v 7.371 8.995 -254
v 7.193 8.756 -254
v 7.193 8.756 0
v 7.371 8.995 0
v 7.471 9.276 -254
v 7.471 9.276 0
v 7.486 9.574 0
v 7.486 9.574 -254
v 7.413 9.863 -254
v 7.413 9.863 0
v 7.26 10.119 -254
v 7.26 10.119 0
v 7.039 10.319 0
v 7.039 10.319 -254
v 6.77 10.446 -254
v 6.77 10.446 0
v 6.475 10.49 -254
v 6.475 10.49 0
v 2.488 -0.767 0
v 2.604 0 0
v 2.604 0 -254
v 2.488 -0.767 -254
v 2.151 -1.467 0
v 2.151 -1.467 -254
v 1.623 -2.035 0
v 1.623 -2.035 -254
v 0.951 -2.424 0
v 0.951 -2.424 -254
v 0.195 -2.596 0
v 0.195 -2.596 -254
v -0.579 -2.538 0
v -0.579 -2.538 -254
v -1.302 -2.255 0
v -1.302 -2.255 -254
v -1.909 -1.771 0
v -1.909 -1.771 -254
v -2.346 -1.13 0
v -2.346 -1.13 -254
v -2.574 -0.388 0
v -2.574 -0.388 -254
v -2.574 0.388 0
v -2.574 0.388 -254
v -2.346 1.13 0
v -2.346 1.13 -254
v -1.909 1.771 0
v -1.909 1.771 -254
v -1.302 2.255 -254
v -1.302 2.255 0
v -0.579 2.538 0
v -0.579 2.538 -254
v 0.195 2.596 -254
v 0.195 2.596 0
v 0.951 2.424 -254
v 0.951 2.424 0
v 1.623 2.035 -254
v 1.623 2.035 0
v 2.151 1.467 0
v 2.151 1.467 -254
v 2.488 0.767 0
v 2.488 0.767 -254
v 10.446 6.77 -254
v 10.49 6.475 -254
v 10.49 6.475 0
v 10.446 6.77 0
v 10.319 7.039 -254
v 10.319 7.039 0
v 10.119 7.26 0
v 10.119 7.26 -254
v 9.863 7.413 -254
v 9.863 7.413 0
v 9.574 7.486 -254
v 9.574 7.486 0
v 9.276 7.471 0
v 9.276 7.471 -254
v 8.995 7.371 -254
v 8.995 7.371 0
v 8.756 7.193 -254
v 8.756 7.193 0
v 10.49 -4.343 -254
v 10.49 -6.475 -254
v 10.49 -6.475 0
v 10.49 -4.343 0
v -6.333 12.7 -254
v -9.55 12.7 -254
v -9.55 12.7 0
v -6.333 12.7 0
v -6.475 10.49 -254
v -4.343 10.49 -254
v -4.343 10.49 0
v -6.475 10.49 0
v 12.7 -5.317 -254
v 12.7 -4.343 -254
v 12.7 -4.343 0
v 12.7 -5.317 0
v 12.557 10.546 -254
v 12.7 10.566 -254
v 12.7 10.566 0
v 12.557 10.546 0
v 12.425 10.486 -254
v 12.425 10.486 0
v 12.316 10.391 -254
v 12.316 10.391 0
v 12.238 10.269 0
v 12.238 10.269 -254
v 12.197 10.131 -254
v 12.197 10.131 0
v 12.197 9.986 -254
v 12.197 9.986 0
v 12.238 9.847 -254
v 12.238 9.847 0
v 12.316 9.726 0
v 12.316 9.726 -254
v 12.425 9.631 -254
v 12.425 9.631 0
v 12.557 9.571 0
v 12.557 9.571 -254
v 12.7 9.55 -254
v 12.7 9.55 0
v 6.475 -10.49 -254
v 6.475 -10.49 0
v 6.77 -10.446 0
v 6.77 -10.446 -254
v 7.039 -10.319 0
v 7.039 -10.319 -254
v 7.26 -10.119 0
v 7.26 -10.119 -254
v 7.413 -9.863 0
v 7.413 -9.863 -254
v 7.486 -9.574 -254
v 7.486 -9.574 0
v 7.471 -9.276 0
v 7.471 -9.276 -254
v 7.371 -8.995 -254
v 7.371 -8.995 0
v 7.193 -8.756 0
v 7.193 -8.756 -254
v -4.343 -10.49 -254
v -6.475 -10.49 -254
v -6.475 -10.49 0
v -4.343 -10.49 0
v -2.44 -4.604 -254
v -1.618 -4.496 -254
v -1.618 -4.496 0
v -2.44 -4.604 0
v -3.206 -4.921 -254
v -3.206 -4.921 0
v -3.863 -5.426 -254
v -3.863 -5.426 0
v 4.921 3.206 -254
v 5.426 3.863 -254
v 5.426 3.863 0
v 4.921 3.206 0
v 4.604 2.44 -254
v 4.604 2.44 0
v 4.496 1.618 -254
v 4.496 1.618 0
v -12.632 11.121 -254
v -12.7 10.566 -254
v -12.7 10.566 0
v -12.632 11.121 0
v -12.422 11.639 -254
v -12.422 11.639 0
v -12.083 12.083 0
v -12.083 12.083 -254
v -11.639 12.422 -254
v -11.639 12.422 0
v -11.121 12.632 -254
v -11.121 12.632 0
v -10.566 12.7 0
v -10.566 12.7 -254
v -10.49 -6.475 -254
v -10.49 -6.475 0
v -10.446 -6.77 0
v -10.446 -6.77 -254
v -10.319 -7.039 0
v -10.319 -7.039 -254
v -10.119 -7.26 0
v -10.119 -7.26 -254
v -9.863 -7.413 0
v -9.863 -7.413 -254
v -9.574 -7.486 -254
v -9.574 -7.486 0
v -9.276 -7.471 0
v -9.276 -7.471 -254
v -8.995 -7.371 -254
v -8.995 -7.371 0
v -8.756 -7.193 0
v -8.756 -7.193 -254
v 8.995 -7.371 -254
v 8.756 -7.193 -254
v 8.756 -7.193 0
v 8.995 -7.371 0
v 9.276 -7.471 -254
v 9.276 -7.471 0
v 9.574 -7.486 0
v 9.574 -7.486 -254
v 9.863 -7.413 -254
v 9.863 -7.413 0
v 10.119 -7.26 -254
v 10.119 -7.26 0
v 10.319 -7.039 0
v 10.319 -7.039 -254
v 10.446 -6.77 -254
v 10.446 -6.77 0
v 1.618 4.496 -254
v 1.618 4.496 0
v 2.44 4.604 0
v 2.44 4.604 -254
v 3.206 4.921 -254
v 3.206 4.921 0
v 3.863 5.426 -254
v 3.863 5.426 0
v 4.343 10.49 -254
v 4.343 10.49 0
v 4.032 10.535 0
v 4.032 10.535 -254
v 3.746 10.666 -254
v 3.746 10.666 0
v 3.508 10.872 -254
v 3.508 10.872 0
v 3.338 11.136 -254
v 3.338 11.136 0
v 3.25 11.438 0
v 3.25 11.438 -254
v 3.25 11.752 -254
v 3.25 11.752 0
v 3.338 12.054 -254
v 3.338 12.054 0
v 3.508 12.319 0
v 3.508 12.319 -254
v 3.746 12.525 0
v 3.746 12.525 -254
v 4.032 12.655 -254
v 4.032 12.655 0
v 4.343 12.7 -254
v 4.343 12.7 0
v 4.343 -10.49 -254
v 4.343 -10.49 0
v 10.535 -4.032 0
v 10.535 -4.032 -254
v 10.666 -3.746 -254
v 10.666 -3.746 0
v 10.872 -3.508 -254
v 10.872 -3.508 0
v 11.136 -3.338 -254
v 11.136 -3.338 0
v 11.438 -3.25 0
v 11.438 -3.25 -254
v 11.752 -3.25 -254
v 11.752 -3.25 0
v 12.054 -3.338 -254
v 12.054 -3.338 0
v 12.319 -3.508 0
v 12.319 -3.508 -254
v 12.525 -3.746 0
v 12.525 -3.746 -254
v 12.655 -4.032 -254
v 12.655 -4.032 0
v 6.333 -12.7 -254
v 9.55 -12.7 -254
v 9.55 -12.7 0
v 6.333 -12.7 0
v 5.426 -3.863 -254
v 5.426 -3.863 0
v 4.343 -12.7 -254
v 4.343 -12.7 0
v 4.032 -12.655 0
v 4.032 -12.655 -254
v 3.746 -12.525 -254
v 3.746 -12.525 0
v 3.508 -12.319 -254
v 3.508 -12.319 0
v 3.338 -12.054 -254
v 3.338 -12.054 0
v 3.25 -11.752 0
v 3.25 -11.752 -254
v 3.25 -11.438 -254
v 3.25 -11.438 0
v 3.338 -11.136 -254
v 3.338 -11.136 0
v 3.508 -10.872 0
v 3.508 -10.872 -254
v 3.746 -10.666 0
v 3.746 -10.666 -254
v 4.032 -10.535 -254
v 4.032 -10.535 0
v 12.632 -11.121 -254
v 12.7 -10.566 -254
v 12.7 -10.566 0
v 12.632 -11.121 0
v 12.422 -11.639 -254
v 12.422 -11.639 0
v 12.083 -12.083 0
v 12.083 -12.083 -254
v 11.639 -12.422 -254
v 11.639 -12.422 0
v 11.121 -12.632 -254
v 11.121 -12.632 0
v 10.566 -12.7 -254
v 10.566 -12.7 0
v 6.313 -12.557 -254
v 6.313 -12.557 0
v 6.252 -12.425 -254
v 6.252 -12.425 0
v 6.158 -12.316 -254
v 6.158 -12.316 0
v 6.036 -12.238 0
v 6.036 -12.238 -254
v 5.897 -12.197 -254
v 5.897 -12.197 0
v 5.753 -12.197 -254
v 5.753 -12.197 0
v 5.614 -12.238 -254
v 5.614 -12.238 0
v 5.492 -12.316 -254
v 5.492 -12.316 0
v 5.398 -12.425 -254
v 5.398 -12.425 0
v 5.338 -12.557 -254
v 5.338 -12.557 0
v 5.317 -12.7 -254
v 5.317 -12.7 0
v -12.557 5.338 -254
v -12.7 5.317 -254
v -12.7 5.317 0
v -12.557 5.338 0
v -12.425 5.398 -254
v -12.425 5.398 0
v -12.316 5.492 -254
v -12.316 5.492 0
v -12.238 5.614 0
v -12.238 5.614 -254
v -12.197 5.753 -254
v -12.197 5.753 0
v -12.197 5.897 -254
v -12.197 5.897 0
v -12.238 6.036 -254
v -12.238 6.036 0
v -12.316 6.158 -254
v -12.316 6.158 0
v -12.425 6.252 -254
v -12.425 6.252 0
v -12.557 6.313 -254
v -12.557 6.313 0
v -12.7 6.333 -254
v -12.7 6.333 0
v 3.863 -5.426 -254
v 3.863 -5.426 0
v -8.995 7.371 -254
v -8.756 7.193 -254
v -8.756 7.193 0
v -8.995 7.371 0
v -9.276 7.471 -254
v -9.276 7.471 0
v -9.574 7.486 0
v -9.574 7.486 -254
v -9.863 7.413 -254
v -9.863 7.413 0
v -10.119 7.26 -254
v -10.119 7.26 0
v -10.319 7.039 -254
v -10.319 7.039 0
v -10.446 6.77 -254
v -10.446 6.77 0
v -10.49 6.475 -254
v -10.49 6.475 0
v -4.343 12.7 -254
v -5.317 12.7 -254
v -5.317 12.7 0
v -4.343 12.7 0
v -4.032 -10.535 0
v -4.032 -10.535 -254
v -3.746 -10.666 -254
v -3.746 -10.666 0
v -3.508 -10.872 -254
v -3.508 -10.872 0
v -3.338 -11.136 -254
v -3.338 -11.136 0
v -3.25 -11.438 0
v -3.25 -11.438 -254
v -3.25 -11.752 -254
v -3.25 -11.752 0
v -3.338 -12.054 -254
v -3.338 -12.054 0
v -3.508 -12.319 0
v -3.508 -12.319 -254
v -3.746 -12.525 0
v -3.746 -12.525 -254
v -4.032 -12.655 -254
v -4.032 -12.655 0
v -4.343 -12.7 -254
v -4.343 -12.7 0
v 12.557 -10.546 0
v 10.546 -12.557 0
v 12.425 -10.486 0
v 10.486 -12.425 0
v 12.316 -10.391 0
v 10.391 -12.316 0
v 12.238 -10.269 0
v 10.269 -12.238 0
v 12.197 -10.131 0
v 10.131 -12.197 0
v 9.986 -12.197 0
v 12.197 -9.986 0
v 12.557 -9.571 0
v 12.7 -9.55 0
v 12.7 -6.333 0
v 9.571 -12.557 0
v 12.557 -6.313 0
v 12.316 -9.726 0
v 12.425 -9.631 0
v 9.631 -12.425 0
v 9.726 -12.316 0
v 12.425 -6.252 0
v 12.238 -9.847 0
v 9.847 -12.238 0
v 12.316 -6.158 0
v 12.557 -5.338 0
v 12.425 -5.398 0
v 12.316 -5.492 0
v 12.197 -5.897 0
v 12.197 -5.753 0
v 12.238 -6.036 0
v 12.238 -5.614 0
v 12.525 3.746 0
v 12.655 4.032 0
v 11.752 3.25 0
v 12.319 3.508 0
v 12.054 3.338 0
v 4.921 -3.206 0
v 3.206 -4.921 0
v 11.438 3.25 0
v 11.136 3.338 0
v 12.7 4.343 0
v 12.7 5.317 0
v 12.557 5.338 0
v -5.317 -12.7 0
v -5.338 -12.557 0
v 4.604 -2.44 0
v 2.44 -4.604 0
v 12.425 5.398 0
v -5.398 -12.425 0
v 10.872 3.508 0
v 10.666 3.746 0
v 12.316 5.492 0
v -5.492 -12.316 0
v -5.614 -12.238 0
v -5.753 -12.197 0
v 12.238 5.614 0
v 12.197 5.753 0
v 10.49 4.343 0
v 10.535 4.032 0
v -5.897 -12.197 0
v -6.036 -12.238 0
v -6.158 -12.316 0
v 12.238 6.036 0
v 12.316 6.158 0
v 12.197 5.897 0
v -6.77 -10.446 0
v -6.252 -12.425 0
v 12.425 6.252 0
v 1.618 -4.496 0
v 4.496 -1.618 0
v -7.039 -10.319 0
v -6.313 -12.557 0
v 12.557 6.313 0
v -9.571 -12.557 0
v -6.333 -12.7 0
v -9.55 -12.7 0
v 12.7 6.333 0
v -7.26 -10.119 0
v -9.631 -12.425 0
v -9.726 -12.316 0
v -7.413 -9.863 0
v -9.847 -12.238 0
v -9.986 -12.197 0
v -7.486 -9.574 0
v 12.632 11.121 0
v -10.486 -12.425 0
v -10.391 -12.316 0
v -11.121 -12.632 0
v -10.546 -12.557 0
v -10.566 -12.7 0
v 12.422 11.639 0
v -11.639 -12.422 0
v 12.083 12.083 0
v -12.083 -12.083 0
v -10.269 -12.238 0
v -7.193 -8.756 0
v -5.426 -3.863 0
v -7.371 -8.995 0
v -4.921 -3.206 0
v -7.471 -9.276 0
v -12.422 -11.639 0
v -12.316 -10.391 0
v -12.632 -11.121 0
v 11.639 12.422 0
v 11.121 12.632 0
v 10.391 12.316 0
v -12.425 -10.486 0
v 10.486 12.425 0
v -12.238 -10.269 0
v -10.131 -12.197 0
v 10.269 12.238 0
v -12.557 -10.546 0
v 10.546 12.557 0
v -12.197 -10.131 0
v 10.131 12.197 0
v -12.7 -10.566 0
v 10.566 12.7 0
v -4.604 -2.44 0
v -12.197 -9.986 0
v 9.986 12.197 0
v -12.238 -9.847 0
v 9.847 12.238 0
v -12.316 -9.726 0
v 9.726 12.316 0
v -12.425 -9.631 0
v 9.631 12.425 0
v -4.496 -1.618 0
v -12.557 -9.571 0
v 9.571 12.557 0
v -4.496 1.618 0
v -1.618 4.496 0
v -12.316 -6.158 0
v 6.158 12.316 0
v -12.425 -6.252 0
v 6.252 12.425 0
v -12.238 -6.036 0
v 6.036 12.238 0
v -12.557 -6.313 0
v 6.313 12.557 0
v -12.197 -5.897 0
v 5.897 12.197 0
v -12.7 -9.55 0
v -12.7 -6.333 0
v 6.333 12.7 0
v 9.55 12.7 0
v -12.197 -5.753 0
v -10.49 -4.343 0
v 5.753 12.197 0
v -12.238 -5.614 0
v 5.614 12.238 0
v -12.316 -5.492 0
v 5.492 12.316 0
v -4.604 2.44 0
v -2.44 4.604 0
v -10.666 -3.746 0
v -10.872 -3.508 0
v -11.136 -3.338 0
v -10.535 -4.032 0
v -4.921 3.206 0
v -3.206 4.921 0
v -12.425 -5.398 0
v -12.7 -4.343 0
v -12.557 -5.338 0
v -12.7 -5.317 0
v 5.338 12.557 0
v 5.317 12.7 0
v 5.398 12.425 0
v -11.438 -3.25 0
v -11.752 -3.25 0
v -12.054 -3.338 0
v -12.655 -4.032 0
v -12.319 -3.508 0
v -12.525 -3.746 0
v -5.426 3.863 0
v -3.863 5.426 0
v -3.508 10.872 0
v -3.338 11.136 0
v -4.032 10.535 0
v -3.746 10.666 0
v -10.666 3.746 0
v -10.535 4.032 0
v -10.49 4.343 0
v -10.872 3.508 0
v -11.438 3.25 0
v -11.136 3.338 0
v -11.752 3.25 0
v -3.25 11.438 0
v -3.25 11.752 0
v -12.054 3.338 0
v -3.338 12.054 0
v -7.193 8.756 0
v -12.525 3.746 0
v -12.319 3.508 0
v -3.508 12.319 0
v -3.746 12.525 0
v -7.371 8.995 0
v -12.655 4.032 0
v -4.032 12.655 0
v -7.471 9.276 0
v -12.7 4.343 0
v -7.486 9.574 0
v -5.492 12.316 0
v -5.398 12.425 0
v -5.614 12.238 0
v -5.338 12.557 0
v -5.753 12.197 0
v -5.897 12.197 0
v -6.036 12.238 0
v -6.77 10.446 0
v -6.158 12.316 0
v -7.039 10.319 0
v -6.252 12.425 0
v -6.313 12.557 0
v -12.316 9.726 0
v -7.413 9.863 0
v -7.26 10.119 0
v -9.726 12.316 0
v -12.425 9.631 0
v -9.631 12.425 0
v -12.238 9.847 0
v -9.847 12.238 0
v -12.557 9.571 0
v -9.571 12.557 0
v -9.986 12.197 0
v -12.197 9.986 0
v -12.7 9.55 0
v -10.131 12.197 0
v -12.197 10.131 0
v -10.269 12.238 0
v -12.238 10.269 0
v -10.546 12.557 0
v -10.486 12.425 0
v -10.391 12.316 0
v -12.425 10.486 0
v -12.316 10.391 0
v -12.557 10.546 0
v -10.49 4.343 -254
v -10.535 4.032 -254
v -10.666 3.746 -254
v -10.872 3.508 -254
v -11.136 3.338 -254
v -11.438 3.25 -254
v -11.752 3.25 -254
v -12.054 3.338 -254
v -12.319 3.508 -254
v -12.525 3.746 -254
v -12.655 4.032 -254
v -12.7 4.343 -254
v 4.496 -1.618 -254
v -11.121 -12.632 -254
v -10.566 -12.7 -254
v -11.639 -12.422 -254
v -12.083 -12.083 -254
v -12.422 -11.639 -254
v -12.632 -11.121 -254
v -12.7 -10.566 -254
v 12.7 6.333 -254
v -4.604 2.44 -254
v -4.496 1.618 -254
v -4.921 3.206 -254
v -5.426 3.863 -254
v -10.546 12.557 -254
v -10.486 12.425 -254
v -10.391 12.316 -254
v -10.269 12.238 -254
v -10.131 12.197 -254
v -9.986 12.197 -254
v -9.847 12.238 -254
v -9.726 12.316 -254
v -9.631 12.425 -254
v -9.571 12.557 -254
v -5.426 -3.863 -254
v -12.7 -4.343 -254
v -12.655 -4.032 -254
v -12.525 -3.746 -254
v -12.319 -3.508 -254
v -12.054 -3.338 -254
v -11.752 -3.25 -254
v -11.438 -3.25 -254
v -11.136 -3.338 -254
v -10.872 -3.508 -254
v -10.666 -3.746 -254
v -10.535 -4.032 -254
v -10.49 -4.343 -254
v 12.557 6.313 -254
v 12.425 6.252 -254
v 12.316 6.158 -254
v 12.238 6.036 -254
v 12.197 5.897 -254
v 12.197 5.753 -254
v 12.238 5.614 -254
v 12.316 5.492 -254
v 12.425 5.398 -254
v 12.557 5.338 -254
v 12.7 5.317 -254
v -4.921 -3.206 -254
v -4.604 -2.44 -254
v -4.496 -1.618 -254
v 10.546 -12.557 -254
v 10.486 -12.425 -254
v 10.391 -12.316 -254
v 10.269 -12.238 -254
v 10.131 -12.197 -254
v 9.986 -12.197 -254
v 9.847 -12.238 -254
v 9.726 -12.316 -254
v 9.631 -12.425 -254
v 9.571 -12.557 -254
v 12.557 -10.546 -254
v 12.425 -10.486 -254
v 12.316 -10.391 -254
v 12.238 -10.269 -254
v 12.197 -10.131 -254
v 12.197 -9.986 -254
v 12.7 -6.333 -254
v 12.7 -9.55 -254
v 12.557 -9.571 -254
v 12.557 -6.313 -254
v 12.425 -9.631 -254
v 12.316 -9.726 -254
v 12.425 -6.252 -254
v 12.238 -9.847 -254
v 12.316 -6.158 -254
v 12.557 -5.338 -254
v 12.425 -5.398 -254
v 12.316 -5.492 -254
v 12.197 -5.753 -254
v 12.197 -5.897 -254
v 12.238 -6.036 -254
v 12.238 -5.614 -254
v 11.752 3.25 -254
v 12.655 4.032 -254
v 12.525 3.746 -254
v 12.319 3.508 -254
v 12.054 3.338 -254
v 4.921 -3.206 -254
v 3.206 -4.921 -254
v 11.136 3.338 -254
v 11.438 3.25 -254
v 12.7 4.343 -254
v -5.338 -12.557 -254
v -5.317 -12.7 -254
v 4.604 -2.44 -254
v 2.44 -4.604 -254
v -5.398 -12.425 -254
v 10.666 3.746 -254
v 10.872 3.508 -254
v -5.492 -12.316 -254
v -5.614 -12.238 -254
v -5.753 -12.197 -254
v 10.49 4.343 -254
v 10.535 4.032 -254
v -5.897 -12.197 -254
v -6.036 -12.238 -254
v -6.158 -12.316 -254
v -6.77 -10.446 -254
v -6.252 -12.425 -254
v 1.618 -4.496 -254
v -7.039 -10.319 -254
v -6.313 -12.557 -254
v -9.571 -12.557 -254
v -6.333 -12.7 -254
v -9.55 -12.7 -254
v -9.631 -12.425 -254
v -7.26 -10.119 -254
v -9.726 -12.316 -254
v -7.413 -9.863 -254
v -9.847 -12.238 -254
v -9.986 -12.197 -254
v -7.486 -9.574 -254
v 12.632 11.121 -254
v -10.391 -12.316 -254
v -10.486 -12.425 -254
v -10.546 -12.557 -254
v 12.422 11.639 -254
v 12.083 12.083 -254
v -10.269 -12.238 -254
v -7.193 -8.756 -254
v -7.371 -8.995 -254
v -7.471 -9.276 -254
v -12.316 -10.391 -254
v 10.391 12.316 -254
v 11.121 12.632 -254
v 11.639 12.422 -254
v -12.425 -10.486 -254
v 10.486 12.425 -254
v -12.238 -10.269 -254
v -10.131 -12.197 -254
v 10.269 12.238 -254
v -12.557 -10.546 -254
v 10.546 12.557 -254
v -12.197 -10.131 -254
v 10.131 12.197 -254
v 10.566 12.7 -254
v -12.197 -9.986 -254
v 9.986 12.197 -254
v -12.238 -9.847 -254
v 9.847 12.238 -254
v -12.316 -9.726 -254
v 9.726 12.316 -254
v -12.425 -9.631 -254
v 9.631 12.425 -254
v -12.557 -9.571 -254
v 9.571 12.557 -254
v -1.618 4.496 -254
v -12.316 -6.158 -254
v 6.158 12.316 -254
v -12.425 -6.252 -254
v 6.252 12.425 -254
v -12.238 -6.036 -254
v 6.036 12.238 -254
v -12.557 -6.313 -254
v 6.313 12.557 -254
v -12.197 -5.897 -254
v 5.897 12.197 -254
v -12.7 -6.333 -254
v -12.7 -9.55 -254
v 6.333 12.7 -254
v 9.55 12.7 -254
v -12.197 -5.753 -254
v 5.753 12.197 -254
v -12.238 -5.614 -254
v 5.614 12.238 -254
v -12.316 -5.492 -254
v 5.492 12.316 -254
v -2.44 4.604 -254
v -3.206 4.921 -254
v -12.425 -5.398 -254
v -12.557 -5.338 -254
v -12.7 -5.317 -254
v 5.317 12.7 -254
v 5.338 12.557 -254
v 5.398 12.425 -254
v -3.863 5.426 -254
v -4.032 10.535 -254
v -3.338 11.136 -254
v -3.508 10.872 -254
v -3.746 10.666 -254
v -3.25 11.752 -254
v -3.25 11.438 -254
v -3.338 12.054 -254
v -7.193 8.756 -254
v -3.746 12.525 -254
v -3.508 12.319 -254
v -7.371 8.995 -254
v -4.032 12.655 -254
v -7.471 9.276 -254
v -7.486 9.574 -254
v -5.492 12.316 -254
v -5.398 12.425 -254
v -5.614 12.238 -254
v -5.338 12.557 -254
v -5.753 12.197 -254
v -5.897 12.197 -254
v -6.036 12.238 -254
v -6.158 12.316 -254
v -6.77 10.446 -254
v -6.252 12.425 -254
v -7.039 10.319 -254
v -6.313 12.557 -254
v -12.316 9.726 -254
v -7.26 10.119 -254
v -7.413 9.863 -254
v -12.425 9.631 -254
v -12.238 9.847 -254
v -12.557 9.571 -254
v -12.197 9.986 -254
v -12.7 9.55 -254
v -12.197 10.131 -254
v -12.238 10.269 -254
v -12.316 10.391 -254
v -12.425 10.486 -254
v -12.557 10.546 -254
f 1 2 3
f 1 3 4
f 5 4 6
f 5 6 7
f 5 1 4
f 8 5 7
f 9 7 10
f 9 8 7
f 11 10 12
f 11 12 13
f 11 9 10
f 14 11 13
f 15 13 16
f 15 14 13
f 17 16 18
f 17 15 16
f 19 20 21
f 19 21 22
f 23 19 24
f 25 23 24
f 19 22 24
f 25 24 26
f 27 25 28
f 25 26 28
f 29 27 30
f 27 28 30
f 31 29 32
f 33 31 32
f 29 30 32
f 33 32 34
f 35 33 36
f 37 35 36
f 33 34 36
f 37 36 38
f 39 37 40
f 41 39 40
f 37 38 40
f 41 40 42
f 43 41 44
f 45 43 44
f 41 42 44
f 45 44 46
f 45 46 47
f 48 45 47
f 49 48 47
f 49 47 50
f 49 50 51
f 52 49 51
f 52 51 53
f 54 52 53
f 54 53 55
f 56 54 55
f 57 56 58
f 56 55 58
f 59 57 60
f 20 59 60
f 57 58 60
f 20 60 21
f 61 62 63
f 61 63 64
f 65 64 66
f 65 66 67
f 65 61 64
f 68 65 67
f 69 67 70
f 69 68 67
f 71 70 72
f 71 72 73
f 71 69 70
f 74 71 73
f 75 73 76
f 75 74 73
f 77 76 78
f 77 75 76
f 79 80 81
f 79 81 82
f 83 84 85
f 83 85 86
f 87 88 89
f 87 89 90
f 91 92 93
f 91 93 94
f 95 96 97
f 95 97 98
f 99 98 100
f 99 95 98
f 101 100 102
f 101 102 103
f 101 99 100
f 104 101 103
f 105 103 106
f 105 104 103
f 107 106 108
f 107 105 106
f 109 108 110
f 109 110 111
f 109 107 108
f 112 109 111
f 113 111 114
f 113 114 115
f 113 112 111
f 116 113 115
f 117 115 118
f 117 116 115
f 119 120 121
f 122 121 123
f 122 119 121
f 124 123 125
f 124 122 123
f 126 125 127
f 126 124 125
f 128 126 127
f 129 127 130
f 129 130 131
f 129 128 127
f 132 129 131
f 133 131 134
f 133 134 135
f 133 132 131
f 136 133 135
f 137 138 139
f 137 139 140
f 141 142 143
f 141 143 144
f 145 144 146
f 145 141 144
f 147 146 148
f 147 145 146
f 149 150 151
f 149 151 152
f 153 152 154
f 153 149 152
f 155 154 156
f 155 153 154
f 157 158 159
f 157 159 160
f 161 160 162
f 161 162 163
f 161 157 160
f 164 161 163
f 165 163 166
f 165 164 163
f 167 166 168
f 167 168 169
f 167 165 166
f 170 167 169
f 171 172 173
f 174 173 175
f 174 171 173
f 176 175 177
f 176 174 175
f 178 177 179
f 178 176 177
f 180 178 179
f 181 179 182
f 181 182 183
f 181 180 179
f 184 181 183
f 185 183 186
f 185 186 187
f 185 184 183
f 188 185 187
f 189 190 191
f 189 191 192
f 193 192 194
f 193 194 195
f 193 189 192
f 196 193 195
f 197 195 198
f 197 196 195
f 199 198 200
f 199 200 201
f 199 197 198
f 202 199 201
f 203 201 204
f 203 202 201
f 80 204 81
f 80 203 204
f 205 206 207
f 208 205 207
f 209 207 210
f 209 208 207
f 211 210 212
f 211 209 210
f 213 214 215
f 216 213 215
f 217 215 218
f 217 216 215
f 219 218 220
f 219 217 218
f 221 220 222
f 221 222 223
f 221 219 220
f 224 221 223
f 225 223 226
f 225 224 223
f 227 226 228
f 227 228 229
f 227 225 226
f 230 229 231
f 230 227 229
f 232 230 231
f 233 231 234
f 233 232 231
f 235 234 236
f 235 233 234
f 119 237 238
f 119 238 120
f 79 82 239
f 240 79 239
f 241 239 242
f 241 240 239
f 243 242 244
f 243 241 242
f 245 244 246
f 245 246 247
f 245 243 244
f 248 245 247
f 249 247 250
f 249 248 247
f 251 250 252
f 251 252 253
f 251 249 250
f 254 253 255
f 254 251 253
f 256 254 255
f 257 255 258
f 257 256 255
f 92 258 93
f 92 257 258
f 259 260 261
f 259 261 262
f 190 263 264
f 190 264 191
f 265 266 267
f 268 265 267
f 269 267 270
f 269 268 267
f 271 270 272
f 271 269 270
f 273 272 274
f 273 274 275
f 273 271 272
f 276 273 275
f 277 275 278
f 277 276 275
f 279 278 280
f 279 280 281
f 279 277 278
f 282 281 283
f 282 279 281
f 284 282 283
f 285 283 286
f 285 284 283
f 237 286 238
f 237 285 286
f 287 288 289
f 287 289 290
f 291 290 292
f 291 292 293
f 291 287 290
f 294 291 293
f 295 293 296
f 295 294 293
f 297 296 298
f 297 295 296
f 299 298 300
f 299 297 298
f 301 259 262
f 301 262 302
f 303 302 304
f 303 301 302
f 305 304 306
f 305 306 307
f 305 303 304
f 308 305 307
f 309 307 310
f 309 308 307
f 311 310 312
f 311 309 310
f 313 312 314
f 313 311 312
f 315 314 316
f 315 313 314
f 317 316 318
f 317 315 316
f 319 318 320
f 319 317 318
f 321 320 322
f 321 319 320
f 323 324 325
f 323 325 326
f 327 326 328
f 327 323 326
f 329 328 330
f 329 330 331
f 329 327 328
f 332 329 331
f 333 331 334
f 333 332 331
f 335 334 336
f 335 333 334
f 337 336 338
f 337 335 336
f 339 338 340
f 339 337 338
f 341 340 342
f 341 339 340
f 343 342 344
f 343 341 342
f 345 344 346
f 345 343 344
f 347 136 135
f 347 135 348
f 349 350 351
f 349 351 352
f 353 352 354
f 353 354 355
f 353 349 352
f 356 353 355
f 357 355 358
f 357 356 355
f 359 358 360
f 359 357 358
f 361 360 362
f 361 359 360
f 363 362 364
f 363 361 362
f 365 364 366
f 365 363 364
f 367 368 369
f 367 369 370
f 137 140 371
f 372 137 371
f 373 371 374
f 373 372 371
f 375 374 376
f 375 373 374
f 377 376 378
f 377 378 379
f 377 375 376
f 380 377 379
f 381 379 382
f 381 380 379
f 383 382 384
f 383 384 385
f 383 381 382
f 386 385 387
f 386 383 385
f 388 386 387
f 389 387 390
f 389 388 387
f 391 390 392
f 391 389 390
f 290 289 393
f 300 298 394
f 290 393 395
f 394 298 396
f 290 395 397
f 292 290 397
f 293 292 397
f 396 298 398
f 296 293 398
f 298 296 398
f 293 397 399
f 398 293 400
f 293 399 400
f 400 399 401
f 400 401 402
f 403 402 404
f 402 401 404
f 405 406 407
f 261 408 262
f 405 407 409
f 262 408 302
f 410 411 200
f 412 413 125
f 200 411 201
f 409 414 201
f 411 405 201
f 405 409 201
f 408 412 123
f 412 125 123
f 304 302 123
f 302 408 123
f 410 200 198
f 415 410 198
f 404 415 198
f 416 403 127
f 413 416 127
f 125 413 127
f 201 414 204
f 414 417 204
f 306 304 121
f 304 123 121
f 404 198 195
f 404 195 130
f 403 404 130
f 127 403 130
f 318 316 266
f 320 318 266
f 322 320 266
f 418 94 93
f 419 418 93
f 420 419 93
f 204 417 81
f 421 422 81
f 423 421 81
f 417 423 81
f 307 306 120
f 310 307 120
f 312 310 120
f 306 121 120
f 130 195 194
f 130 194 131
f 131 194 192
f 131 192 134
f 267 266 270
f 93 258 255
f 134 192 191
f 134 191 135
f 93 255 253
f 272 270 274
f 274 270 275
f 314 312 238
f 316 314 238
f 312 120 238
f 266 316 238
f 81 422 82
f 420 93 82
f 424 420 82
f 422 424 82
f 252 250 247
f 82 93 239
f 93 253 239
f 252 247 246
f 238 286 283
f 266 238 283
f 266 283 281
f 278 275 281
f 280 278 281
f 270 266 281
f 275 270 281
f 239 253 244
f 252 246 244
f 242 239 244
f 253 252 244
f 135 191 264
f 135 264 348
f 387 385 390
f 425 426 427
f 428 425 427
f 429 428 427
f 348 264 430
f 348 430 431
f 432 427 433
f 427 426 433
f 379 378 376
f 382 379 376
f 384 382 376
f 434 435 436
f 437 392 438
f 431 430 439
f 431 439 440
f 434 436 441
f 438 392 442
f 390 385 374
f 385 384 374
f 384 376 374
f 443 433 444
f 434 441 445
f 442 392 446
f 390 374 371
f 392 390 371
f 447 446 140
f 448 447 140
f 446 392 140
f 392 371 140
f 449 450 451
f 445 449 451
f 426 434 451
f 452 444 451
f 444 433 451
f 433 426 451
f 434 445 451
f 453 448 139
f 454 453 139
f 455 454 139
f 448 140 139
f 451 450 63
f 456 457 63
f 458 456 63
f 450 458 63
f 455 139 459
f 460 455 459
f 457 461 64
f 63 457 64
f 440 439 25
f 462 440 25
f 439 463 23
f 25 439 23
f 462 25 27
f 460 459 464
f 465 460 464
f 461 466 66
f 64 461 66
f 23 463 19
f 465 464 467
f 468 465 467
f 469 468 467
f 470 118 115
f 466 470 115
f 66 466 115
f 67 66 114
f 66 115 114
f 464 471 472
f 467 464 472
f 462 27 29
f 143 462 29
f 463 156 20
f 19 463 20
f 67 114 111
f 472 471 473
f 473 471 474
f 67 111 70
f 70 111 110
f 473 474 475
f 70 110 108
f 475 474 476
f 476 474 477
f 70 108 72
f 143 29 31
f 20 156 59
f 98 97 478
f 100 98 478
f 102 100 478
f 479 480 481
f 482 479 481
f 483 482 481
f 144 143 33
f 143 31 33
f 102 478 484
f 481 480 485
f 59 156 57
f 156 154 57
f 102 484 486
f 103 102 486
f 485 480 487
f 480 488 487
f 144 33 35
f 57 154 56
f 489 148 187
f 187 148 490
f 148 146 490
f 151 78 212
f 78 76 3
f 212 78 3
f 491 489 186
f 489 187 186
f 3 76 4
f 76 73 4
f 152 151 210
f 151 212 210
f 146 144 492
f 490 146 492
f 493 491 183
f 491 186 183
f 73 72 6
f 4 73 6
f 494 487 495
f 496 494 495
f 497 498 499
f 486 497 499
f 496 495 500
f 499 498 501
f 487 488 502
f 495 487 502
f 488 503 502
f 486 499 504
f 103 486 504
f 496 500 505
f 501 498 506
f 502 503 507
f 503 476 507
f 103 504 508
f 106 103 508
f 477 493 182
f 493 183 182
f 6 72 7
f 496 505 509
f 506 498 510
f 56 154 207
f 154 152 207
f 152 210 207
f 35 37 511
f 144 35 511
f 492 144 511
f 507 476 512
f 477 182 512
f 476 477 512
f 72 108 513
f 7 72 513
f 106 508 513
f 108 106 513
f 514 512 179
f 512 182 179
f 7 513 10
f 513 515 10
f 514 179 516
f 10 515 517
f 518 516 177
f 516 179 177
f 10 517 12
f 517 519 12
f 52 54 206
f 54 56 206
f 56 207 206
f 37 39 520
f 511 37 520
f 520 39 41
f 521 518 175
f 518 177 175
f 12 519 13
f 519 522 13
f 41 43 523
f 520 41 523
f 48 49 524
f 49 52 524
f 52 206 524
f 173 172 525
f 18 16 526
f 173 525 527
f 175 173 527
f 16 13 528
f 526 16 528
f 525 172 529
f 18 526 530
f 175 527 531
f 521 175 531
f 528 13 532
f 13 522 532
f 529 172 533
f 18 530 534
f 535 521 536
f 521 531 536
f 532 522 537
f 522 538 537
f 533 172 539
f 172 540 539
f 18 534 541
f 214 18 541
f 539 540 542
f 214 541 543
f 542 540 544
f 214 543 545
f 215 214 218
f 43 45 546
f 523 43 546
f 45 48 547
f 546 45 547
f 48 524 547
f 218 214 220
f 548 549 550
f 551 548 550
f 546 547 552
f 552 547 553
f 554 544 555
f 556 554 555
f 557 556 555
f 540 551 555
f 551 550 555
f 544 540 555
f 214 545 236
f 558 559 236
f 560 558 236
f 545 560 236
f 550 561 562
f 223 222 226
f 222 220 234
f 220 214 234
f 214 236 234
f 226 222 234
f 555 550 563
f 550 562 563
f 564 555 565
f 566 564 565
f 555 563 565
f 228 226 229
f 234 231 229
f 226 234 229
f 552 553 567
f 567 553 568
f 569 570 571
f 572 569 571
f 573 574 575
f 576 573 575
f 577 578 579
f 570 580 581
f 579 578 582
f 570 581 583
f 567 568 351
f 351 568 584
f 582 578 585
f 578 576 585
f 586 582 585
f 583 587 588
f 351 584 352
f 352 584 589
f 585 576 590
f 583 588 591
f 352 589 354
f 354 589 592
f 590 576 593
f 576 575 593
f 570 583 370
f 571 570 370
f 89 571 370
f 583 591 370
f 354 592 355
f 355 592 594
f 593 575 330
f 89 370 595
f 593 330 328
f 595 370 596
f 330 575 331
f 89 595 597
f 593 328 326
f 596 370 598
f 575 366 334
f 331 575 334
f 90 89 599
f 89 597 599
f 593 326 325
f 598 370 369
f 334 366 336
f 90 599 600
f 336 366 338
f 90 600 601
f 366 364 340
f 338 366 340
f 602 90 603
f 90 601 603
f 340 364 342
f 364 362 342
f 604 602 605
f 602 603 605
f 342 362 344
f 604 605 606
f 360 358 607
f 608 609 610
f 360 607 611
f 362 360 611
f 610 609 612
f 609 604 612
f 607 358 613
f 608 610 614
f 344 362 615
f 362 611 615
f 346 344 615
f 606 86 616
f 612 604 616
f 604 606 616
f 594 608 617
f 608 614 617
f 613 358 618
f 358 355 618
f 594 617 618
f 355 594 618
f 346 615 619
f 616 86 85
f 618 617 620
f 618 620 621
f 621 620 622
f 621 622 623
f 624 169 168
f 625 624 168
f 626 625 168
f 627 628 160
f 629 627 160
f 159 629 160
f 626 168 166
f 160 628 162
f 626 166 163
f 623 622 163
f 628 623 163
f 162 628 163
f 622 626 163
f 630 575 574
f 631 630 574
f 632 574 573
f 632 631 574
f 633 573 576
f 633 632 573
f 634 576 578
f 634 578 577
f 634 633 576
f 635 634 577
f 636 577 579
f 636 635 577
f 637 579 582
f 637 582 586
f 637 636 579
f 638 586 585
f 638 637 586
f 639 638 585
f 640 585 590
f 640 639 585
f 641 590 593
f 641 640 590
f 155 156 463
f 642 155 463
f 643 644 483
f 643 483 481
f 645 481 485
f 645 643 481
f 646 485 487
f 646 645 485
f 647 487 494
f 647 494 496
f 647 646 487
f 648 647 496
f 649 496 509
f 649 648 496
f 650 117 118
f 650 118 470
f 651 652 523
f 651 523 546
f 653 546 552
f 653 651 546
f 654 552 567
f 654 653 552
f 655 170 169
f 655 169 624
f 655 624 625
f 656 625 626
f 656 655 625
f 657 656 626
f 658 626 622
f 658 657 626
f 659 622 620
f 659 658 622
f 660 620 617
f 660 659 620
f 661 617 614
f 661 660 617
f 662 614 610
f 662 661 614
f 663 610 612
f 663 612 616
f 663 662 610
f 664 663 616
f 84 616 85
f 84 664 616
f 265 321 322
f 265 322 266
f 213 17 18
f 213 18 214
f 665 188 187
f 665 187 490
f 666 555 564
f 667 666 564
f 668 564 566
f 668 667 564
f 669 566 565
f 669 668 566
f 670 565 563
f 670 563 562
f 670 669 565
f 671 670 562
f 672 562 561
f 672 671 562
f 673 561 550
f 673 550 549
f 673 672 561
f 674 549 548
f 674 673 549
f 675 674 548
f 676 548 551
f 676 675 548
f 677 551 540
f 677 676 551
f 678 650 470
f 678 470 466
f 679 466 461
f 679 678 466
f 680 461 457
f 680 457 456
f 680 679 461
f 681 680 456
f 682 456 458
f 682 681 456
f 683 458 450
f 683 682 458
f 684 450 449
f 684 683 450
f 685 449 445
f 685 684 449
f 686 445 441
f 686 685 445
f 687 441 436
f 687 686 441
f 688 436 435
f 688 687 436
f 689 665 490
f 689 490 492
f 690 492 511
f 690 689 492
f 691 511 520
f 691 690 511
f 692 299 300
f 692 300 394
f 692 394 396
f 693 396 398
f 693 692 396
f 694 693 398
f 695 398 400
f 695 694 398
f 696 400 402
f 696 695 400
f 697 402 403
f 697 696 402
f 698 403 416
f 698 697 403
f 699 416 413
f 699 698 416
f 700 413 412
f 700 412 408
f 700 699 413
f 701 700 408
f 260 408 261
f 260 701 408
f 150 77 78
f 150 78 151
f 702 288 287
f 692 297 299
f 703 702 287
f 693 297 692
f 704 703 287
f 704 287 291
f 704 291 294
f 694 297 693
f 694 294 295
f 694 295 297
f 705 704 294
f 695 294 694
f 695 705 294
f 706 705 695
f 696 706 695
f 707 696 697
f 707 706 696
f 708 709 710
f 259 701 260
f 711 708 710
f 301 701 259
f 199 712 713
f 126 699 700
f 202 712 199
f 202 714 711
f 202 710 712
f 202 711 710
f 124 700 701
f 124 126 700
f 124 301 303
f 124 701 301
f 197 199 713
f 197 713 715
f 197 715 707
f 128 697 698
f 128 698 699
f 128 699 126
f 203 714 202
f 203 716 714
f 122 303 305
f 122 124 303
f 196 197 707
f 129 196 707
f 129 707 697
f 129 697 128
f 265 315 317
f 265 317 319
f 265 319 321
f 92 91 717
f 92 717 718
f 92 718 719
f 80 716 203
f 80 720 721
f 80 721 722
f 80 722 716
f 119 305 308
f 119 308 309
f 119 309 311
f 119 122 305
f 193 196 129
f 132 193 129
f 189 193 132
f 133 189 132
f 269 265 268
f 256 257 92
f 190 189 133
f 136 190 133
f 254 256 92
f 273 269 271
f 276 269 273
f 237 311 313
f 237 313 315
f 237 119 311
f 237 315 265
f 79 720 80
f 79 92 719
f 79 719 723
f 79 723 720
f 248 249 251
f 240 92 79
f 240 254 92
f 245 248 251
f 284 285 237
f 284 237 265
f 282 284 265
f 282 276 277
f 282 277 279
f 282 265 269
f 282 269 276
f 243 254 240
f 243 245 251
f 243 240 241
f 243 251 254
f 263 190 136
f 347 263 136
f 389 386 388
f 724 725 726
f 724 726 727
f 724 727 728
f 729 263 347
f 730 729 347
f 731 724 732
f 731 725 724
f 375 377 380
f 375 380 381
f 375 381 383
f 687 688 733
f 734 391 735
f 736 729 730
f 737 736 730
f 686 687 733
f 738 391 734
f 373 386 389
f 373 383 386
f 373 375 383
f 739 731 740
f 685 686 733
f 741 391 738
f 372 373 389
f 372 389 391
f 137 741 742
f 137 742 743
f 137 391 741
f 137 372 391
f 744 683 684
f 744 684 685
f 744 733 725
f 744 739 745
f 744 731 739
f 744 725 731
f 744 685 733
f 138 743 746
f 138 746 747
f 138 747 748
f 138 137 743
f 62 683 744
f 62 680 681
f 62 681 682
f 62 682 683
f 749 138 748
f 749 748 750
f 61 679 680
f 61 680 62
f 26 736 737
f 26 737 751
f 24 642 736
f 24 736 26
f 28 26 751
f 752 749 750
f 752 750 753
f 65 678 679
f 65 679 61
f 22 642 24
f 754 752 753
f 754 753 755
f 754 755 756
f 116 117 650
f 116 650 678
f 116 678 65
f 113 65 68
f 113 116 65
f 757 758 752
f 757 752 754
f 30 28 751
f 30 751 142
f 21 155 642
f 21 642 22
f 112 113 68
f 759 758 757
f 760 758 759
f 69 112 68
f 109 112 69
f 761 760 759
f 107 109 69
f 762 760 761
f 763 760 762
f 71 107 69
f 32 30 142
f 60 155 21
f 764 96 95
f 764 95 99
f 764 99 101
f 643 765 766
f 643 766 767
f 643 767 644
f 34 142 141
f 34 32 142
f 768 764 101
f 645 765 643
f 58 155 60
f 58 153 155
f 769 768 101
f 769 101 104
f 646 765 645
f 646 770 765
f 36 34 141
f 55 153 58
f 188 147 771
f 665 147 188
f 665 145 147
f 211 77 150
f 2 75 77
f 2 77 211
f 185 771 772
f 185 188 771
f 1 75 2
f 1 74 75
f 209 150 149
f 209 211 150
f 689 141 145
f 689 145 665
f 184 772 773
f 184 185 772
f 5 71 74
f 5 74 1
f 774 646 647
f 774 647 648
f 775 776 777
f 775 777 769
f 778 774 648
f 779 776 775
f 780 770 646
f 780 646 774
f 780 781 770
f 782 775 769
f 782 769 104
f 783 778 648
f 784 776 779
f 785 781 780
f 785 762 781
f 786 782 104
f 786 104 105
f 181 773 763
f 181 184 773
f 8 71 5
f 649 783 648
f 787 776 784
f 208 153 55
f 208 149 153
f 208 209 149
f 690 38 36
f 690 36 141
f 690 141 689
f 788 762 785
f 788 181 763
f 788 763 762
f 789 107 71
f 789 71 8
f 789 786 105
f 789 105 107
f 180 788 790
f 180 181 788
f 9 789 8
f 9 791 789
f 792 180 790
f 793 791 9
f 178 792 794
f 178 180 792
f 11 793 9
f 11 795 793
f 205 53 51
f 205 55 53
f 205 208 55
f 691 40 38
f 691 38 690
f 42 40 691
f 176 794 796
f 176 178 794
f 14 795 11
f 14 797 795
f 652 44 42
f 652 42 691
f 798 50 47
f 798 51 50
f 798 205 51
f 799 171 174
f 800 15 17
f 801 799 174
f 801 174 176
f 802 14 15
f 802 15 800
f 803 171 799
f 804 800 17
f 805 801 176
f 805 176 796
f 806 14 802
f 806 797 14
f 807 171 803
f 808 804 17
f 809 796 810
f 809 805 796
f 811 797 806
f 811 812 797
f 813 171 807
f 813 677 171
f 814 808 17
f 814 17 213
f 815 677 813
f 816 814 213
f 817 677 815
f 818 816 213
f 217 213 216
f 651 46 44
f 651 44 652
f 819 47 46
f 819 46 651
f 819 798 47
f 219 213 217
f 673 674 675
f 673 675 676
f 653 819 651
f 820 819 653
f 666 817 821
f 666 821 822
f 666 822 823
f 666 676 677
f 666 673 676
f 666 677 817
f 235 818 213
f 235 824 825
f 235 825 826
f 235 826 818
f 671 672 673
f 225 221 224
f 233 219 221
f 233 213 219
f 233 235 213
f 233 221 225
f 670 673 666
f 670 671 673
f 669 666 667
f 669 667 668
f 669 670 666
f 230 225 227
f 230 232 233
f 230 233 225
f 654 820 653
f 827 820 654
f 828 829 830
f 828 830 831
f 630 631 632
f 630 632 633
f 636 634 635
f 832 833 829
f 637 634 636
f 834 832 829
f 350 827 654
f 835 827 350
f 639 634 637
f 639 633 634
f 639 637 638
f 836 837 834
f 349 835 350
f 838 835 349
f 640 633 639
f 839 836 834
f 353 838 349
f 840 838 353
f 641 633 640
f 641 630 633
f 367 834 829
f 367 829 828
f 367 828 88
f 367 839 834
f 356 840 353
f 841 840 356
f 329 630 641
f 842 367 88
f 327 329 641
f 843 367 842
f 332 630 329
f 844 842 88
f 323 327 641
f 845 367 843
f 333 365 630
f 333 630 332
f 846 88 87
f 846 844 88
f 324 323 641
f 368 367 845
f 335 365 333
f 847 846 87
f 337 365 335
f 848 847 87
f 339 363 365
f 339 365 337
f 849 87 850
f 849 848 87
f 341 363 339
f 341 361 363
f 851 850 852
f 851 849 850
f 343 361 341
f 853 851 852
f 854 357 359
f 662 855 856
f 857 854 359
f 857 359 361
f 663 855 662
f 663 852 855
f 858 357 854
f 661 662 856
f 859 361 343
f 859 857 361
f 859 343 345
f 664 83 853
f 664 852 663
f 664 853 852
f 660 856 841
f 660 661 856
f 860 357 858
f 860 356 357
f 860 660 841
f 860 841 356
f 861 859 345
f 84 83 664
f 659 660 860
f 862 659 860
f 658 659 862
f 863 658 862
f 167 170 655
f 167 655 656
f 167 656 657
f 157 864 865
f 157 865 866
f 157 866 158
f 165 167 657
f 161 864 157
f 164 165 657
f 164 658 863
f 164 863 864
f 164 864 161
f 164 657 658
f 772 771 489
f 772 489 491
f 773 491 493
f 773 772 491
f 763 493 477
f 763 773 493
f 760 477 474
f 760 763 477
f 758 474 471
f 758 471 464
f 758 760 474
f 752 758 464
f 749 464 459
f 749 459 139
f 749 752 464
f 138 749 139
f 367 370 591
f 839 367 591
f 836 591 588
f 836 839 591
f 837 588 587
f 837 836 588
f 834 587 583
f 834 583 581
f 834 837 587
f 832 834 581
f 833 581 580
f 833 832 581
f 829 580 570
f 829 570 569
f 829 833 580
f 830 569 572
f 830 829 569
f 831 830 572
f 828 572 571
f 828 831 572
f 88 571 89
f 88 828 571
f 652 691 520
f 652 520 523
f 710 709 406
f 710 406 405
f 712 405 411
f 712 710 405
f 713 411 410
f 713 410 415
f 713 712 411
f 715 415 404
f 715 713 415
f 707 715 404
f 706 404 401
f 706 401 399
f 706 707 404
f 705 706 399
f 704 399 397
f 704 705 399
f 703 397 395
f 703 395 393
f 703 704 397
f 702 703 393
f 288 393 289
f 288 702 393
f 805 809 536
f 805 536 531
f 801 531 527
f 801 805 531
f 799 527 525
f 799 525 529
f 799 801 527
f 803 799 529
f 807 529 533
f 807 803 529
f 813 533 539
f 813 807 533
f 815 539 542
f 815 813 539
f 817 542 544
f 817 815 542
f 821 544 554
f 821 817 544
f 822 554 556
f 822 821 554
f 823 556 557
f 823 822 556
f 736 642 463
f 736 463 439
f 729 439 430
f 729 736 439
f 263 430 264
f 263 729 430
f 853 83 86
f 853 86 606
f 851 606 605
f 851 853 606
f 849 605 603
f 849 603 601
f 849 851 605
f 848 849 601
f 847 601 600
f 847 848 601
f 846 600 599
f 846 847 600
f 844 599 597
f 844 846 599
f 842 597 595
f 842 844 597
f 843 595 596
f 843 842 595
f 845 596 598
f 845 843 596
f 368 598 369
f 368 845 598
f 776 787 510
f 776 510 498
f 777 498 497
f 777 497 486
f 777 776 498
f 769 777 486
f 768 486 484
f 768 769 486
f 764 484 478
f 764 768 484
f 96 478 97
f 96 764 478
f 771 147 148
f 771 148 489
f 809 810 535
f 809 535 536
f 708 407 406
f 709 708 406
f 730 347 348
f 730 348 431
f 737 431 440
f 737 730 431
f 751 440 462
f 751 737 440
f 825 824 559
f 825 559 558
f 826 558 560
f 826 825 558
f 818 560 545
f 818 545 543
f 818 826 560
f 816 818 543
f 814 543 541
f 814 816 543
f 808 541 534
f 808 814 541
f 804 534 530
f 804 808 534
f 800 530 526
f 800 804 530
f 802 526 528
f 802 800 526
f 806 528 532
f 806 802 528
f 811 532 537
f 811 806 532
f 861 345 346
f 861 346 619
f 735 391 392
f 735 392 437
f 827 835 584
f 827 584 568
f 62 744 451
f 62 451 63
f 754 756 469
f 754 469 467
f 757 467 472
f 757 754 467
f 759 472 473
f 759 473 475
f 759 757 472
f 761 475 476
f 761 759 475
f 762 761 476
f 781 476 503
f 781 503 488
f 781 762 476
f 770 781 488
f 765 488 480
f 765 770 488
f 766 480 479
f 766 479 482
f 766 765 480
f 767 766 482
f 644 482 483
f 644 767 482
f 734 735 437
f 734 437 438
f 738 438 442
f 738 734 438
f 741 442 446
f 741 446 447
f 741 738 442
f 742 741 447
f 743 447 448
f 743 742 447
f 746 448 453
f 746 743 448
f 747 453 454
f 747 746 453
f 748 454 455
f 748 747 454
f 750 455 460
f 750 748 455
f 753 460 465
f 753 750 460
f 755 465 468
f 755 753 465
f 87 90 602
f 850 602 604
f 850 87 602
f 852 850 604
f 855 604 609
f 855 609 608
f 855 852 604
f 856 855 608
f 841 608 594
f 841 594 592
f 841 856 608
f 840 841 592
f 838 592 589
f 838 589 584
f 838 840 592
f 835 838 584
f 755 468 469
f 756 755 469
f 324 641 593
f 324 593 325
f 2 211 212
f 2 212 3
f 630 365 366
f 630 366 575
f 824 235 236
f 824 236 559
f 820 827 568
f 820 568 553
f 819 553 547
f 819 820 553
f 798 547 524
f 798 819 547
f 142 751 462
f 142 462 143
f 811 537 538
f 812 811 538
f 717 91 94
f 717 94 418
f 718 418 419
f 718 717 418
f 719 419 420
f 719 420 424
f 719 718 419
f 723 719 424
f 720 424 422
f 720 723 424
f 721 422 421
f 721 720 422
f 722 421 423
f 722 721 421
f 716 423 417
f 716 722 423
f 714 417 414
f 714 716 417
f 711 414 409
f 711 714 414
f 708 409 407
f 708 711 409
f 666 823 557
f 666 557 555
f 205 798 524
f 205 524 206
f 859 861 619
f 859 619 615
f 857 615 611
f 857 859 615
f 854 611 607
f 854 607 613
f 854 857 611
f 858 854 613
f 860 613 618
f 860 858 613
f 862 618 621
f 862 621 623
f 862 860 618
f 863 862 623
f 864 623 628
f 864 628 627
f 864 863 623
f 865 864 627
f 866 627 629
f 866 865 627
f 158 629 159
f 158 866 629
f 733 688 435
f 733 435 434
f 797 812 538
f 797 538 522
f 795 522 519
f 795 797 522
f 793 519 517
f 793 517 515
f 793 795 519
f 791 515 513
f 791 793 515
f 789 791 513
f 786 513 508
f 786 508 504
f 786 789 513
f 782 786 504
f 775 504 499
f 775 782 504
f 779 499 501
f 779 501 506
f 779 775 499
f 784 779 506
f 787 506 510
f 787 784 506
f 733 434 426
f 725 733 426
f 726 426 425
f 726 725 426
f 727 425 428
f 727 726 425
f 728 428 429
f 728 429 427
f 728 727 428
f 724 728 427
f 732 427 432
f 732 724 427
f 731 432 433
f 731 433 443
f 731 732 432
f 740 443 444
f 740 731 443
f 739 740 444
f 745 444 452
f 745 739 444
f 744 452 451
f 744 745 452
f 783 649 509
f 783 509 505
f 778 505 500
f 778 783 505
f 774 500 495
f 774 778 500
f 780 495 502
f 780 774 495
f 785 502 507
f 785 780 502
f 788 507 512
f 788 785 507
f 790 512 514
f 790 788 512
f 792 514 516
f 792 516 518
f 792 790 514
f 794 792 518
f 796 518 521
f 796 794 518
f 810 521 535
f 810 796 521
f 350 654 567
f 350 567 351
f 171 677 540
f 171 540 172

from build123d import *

# Parameters (mm, degrees)
SKETCH1_R           = 2.6035
BOSS_EXTRUDE1_DEPTH = 254


with BuildPart() as part:
    # Sketch1 → Boss-Extrude1 (new body)
    with BuildSketch(Plane(origin=(0, 0, -254), x_dir=(-1, 0, 0), z_dir=(0, 0, -1))):
        with BuildLine():
            Line((12.700000001, -9.550399995), (12.700000001, -6.333083598))
            ThreePointArc((12.700000001, -6.333083598), (12.192000001, -5.825083598), (12.700000001, -5.317083598))
            Line((12.700000001, -5.317083598), (12.700000001, -4.343399998))
            ThreePointArc((12.700000001, -4.343399998), (11.595100001, -3.238499998), (10.490200001, -4.343399998))
            Line((10.490200001, -4.343399998), (10.490200001, -6.474794454))
            ThreePointArc((10.490200001, -6.474794454), (9.863006368, -7.413456059), (8.755779511, -7.193214943))
            Line((8.755779511, -7.193214943), (5.425735971, -3.863171403))
            ThreePointArc((5.425735971, -3.863171403), (4.737482485, -2.83312727), (4.495800001, -1.618107372))
            Line((4.495800001, -1.618107372), (4.495800001, 1.618107372))
            ThreePointArc((4.495800001, 1.618107372), (4.737482485, 2.83312727), (5.425735971, 3.863171403))
            Line((5.425735971, 3.863171403), (8.755779512, 7.193214944))
            ThreePointArc((8.755779512, 7.193214944), (9.863006368, 7.413456059), (10.490200001, 6.474794455))
            Line((10.490200001, 6.474794455), (10.490200001, 4.343399973))
            ThreePointArc((10.490200001, 4.343399973), (11.595100001, 3.238499973), (12.700000001, 4.343399973))
            Line((12.700000001, 4.343399973), (12.700000001, 5.317083602))
            ThreePointArc((12.700000001, 5.317083602), (12.192000001, 5.825083602), (12.700000001, 6.333083602))
            Line((12.700000001, 6.333083602), (12.700000001, 9.550400003))
            ThreePointArc((12.700000001, 9.550400003), (12.192000008, 10.058323495), (12.699846987, 10.566399978))
            ThreePointArc((12.699846987, 10.566399978), (12.082522518, 12.08252252), (10.566399975, 12.699846984))
            ThreePointArc((10.566399975, 12.699846984), (10.058323492, 12.19200001), (9.550400004, 12.700000002))
            Line((9.550400004, 12.700000002), (6.333083601, 12.700000002))
            ThreePointArc((6.333083601, 12.700000002), (5.825083601, 12.192000002), (5.317083601, 12.700000002))
            Line((5.317083601, 12.700000002), (4.343400001, 12.700000002))
            ThreePointArc((4.343400001, 12.700000002), (3.238500001, 11.595100002), (4.343400001, 10.490200002))
            Line((4.343400001, 10.490200002), (6.474794457, 10.490200002))
            ThreePointArc((6.474794457, 10.490200002), (7.413456062, 9.863006369), (7.193214947, 8.755779512))
            Line((7.193214947, 8.755779512), (3.863171407, 5.425735972))
            ThreePointArc((3.863171407, 5.425735972), (2.833127274, 4.737482486), (1.618107376, 4.495800002))
            Line((1.618107376, 4.495800002), (-1.618107374, 4.495800002))
            ThreePointArc((-1.618107374, 4.495800002), (-2.833127271, 4.737482486), (-3.863171404, 5.425735972))
            Line((-3.863171404, 5.425735972), (-7.193214944, 8.755779512))
            ThreePointArc((-7.193214944, 8.755779512), (-7.41345606, 9.863006369), (-6.474794455, 10.490200002))
            Line((-6.474794455, 10.490200002), (-4.34339997, 10.490200002))
            ThreePointArc((-4.34339997, 10.490200002), (-3.23849997, 11.595100002), (-4.34339997, 12.700000002))
            Line((-4.34339997, 12.700000002), (-5.317083599, 12.700000002))
            ThreePointArc((-5.317083599, 12.700000002), (-5.825083599, 12.192000002), (-6.333083599, 12.700000002))
            Line((-6.333083599, 12.700000002), (-9.550399999, 12.700000002))
            ThreePointArc((-9.550399999, 12.700000002), (-10.058323491, 12.192000008), (-10.566399976, 12.699846986))
            ThreePointArc((-10.566399976, 12.699846986), (-12.082522518, 12.082522518), (-12.699846982, 10.566399974))
            ThreePointArc((-12.699846982, 10.566399974), (-12.192000009, 10.058323491), (-12.7, 9.550400003))
            Line((-12.7, 9.550400003), (-12.7, 6.3330836))
            ThreePointArc((-12.7, 6.3330836), (-12.192, 5.8250836), (-12.7, 5.3170836))
            Line((-12.7, 5.3170836), (-12.7, 4.3434))
            ThreePointArc((-12.7, 4.3434), (-11.5951, 3.2385), (-10.4902, 4.3434))
            Line((-10.4902, 4.3434), (-10.4902, 6.474794456))
            ThreePointArc((-10.4902, 6.474794456), (-9.863006367, 7.413456061), (-8.75577951, 7.193214945))
            Line((-8.75577951, 7.193214945), (-5.42573597, 3.863171405))
            ThreePointArc((-5.42573597, 3.863171405), (-4.737482484, 2.833127272), (-4.4958, 1.618107374))
            Line((-4.4958, 1.618107374), (-4.4958, -1.618107374))
            ThreePointArc((-4.4958, -1.618107374), (-4.737482484, -2.833127272), (-5.42573597, -3.863171405))
            Line((-5.42573597, -3.863171405), (-8.75577951, -7.193214945))
            ThreePointArc((-8.75577951, -7.193214945), (-9.863006367, -7.413456061), (-10.4902, -6.474794456))
            Line((-10.4902, -6.474794456), (-10.4902, -4.343399971))
            ThreePointArc((-10.4902, -4.343399971), (-11.5951, -3.238499971), (-12.7, -4.343399971))
            Line((-12.7, -4.343399971), (-12.7, -5.3170836))
            ThreePointArc((-12.7, -5.3170836), (-12.192, -5.8250836), (-12.7, -6.3330836))
            Line((-12.7, -6.3330836), (-12.7, -9.5504))
            ThreePointArc((-12.7, -9.5504), (-12.192000006, -10.058323492), (-12.699846984, -10.566399977))
            ThreePointArc((-12.699846984, -10.566399977), (-12.082522516, -12.082522519), (-10.566399972, -12.699846983))
            ThreePointArc((-10.566399972, -12.699846983), (-10.058323489, -12.192000009), (-9.550400001, -12.700000001))
            Line((-9.550400001, -12.700000001), (-6.333083598, -12.700000001))
            ThreePointArc((-6.333083598, -12.700000001), (-5.825083598, -12.192000001), (-5.317083598, -12.700000001))
            Line((-5.317083598, -12.700000001), (-4.343399998, -12.700000001))
            ThreePointArc((-4.343399998, -12.700000001), (-3.238499998, -11.595100001), (-4.343399998, -10.490200001))
            Line((-4.343399998, -10.490200001), (-6.474794454, -10.490200001))
            ThreePointArc((-6.474794454, -10.490200001), (-7.413456059, -9.863006368), (-7.193214943, -8.755779511))
            Line((-7.193214943, -8.755779511), (-3.863171403, -5.425735971))
            ThreePointArc((-3.863171403, -5.425735971), (-2.83312727, -4.737482485), (-1.618107372, -4.495800001))
            Line((-1.618107372, -4.495800001), (1.618107375, -4.495800001))
            ThreePointArc((1.618107375, -4.495800001), (2.833127273, -4.737482485), (3.863171406, -5.425735971))
            Line((3.863171406, -5.425735971), (7.193214946, -8.755779512))
            ThreePointArc((7.193214946, -8.755779512), (7.413456062, -9.863006368), (6.474794457, -10.490200001))
            Line((6.474794457, -10.490200001), (4.343399973, -10.490200001))
            ThreePointArc((4.343399973, -10.490200001), (3.238499973, -11.595100001), (4.343399973, -12.700000001))
            Line((4.343399973, -12.700000001), (5.317083602, -12.700000001))
            ThreePointArc((5.317083602, -12.700000001), (5.825083602, -12.192000001), (6.333083602, -12.700000001))
            Line((6.333083602, -12.700000001), (9.550400002, -12.700000001))
            ThreePointArc((9.550400002, -12.700000001), (10.058323494, -12.192000007), (10.566399979, -12.699846985))
            ThreePointArc((10.566399979, -12.699846985), (12.082522519, -12.082522518), (12.699846986, -10.566399978))
            ThreePointArc((12.699846986, -10.566399978), (12.192000004, -10.058323491), (12.700000001, -9.550399995))
        make_face()
        with Locations(Location((0, 0, 0), (0, 0, 180))):
            Circle(SKETCH1_R, mode=Mode.SUBTRACT)
    extrude(amount=-BOSS_EXTRUDE1_DEPTH)


solid = part.part
